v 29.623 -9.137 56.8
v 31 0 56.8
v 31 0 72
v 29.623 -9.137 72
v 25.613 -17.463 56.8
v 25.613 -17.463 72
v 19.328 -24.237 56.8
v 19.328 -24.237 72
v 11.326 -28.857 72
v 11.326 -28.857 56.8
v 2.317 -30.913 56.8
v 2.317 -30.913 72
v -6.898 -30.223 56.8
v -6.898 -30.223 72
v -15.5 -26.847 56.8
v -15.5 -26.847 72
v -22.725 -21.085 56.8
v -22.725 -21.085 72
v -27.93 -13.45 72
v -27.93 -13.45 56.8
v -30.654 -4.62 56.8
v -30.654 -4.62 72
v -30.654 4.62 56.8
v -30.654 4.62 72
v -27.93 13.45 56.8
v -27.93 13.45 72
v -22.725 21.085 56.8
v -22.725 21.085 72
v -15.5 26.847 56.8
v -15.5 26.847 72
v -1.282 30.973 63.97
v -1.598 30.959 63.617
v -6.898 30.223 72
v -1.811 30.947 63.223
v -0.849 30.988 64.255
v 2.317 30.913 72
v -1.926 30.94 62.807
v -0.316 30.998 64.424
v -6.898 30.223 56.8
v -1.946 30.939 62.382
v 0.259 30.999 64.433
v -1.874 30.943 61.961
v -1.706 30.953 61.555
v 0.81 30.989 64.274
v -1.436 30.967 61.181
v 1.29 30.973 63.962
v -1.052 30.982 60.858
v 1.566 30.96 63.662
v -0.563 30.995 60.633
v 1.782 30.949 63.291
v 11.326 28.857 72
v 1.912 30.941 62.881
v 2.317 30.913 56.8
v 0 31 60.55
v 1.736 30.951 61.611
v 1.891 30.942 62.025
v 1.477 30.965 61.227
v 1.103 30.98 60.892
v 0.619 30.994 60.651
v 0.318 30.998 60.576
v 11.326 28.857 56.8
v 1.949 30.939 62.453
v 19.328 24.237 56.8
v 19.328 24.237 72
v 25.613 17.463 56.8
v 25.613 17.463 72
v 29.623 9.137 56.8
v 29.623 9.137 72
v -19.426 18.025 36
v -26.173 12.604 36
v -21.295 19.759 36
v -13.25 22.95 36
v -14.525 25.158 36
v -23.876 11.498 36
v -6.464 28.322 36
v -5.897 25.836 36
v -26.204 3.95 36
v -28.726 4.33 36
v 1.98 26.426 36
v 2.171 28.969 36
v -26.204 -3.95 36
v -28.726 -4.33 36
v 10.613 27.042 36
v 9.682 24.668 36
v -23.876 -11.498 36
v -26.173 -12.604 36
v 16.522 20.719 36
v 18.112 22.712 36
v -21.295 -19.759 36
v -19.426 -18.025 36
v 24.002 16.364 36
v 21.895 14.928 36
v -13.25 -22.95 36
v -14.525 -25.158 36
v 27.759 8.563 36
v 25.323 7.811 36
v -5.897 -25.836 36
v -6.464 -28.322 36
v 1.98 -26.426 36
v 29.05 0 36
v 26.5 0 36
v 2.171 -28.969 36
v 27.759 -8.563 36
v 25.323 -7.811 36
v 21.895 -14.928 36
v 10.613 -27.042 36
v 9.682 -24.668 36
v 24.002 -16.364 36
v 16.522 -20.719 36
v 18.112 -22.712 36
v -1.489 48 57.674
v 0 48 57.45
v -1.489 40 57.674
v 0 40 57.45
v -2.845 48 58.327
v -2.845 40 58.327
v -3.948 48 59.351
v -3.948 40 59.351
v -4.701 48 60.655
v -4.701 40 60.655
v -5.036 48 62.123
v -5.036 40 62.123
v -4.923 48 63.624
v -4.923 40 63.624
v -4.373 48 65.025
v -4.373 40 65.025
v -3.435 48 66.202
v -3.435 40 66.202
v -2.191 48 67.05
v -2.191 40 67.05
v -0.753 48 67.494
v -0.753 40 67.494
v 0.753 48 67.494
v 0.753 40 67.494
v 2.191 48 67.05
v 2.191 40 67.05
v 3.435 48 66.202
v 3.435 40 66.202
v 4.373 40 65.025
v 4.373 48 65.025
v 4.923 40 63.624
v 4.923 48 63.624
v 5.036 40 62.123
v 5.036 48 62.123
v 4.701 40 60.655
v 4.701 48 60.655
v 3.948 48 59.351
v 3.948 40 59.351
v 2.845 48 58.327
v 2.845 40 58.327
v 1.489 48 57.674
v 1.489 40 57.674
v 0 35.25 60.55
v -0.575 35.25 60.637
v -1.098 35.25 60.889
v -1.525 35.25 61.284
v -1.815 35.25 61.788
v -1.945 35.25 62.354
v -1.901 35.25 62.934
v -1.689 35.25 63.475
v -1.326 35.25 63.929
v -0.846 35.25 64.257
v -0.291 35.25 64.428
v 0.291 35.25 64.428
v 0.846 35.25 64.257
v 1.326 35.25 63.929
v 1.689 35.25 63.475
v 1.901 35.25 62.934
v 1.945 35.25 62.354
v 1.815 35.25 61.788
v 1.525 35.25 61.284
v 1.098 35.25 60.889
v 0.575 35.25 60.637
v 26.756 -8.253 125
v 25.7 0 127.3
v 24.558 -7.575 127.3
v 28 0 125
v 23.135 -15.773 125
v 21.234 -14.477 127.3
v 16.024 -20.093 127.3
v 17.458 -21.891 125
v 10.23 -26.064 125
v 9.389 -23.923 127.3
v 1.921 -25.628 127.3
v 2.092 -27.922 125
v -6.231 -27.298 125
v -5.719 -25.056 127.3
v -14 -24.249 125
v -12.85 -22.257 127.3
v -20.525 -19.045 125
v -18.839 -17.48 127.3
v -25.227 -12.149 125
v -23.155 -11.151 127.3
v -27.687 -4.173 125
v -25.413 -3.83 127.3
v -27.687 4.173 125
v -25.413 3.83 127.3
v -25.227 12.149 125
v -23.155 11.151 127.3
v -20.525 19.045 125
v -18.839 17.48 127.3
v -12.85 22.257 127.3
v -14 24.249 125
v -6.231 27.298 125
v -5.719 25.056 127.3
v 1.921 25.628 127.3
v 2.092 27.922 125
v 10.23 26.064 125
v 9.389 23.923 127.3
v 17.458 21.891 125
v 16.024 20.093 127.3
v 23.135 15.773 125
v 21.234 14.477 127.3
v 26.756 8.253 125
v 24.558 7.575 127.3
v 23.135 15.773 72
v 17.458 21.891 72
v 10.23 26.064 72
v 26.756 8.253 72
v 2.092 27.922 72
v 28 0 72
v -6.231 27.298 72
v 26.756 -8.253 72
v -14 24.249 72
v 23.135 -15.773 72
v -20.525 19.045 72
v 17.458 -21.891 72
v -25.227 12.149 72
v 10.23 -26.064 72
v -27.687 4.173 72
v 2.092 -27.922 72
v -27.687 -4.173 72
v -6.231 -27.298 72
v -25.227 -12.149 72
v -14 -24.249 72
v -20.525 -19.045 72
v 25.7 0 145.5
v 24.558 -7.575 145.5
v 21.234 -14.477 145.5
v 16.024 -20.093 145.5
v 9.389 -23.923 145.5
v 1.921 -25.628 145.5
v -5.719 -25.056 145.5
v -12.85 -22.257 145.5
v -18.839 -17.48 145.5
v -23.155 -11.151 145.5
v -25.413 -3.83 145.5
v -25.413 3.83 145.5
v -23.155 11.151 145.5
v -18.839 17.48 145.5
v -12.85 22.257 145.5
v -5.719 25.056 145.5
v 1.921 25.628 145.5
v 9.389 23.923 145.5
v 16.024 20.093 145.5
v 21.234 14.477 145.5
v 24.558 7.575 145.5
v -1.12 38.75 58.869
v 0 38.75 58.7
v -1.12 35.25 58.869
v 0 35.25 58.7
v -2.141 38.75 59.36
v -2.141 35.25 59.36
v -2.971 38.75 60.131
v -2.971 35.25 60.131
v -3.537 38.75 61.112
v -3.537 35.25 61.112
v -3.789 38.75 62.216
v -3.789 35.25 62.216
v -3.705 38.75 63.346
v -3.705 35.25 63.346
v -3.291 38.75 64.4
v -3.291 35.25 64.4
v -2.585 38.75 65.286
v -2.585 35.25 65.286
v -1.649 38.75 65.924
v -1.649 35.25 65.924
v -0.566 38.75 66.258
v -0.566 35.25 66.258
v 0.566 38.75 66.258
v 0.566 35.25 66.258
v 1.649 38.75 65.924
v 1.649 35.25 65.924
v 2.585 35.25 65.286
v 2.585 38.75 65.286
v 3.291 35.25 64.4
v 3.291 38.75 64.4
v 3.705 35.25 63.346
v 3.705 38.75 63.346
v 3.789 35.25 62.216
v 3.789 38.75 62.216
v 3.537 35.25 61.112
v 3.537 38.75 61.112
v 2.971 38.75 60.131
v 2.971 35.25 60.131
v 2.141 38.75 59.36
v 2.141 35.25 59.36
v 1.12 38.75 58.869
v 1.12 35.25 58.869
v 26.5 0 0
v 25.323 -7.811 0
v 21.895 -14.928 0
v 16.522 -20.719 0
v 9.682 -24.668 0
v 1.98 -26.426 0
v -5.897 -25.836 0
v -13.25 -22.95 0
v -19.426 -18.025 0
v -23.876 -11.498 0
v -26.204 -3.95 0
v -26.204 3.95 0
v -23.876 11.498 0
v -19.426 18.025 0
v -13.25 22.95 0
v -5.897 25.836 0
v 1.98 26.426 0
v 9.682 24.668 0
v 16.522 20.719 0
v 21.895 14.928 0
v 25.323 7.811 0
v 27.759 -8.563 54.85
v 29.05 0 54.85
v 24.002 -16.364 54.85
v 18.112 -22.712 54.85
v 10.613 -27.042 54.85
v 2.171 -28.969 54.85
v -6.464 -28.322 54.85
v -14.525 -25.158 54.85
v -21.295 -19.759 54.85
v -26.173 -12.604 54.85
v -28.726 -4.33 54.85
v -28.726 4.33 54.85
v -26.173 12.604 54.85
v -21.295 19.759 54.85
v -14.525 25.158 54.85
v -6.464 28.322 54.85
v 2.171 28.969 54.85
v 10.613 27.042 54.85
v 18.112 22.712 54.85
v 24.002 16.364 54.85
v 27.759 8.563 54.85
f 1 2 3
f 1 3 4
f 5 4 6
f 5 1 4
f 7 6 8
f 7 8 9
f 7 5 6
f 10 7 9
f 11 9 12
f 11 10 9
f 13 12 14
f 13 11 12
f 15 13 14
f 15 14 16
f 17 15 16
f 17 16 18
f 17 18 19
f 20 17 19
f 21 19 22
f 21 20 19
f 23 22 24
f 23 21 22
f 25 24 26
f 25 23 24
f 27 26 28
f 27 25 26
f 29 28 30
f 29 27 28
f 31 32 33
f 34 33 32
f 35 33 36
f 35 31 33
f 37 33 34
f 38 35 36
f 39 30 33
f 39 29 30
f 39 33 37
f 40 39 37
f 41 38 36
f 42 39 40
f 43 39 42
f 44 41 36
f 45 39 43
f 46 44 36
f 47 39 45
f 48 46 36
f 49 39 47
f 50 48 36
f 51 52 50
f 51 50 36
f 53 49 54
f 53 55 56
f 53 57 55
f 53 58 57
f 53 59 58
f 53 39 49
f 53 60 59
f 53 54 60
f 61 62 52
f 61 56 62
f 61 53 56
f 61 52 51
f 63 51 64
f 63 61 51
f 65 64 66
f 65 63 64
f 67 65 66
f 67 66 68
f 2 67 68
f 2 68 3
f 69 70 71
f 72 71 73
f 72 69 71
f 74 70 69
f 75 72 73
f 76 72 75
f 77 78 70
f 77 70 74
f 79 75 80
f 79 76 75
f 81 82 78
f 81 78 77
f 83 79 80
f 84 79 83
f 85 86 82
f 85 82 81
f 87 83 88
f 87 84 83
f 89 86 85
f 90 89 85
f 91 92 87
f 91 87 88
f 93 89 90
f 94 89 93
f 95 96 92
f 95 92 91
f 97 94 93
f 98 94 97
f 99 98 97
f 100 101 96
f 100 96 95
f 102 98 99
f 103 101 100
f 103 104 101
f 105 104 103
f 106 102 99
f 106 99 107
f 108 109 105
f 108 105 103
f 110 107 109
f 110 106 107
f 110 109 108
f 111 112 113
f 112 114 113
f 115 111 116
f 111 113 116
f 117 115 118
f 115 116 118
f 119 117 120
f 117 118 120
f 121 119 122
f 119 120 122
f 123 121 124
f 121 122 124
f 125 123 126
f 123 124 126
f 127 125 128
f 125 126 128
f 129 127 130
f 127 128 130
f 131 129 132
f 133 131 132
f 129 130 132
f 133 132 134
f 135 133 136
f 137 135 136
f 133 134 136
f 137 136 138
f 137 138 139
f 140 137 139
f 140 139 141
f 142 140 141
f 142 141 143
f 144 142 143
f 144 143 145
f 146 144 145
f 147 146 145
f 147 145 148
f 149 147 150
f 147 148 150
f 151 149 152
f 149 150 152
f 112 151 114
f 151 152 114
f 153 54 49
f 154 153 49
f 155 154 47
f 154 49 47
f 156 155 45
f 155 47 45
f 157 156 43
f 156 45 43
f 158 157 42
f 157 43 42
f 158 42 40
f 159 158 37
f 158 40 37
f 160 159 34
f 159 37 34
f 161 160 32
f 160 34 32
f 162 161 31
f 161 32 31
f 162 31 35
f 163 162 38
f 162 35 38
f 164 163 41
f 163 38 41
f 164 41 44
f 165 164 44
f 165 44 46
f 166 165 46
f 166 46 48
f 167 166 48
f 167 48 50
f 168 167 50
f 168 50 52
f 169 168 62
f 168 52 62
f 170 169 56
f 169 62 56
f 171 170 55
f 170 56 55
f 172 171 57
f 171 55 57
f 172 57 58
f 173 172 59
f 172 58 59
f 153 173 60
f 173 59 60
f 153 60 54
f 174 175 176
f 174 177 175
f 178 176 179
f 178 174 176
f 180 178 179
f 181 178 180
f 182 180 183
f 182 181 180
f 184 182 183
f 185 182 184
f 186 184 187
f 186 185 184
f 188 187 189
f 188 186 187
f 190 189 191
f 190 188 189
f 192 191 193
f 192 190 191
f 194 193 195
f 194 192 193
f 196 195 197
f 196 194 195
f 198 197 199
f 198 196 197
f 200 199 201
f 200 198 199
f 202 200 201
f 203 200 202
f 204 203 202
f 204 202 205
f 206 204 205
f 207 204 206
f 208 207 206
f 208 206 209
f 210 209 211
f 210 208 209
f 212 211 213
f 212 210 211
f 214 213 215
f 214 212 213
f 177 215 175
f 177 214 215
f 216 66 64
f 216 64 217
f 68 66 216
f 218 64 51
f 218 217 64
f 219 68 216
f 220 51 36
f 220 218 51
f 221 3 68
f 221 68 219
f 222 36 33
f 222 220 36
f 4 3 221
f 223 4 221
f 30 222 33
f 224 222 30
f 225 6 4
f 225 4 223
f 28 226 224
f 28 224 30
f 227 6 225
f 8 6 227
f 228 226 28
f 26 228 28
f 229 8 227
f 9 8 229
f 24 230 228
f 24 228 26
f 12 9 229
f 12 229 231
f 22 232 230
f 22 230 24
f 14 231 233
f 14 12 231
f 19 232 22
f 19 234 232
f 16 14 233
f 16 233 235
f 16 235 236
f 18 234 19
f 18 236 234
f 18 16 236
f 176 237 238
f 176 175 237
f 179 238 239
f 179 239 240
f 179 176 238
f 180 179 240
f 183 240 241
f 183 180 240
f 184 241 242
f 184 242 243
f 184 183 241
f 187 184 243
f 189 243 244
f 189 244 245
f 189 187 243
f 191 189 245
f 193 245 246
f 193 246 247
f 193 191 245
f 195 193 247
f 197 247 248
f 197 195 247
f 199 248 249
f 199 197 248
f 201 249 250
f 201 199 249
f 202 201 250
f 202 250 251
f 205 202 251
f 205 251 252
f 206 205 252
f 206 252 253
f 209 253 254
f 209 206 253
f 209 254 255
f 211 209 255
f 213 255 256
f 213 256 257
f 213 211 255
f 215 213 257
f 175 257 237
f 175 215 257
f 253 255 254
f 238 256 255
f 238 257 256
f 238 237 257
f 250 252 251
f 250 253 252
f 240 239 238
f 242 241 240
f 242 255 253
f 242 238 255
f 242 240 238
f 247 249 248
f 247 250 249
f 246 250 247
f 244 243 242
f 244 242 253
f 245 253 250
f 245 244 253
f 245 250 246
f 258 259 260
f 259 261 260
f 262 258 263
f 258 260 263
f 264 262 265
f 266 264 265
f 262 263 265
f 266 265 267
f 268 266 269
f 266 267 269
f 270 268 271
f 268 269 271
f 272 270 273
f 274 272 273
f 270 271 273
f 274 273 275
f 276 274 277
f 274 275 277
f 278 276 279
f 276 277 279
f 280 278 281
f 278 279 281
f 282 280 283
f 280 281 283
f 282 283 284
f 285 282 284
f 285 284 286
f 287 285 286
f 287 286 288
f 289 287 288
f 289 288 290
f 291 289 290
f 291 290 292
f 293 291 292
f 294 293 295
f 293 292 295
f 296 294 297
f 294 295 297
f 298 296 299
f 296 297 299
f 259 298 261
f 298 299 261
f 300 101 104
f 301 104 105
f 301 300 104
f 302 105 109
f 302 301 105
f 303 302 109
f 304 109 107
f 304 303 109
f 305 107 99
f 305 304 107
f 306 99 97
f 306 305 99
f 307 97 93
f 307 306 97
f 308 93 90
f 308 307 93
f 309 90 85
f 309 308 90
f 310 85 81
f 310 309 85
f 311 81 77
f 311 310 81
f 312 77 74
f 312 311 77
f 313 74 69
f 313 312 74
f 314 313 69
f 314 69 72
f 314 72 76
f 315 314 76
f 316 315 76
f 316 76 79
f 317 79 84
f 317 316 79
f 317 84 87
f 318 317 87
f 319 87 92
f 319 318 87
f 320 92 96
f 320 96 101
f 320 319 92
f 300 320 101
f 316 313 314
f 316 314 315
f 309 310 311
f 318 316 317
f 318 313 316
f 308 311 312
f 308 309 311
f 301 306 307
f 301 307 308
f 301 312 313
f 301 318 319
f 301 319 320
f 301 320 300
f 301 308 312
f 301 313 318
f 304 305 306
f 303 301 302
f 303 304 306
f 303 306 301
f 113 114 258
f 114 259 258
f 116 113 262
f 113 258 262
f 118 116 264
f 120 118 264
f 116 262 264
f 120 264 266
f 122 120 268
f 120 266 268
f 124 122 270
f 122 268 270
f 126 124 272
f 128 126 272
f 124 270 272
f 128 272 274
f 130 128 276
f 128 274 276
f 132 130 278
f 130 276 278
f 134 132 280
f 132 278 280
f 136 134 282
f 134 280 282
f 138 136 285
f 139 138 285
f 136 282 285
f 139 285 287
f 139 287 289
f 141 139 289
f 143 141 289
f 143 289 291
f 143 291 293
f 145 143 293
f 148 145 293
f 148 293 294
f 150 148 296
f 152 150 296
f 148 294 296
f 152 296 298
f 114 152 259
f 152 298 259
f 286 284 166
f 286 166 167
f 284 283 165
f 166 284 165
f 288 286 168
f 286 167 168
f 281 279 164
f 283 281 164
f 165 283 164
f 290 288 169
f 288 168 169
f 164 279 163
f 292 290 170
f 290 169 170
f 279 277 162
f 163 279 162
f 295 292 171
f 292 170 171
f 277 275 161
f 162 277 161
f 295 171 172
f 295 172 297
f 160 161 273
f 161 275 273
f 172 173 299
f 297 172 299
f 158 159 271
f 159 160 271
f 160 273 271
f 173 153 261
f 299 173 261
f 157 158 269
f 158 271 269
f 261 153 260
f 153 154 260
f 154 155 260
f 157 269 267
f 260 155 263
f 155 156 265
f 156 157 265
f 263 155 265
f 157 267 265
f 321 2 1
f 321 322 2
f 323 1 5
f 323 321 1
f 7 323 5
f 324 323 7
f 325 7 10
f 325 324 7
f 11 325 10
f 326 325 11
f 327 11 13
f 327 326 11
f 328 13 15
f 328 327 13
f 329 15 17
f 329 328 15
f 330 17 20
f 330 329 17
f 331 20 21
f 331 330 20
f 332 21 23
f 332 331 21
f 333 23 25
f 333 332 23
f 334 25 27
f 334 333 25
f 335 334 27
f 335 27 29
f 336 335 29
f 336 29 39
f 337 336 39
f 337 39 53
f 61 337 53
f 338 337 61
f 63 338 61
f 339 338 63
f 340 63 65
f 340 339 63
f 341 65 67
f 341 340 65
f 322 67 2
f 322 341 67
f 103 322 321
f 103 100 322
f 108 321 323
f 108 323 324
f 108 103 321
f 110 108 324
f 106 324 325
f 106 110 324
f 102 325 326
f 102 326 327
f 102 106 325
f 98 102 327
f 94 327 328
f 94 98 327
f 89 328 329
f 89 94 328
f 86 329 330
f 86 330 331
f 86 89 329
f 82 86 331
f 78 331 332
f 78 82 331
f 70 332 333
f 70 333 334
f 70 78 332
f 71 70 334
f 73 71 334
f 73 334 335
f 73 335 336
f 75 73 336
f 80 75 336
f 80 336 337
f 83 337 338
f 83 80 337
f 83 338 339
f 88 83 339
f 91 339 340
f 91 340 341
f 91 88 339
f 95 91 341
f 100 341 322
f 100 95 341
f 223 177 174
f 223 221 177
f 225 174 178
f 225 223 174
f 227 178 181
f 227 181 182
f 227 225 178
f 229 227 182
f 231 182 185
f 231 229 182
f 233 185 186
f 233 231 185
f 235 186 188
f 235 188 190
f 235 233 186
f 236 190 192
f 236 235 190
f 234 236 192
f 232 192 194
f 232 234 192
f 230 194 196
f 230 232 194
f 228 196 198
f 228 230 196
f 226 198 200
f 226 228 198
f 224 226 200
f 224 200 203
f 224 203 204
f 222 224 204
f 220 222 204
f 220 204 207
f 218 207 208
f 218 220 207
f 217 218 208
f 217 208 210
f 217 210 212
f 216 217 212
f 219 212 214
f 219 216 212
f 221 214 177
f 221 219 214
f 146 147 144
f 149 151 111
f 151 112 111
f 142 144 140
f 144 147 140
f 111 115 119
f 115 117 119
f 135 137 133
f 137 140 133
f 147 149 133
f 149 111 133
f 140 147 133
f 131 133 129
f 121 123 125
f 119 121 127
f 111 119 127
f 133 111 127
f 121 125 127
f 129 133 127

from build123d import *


with BuildPart() as part:
    # Sketch1 → Revolve1 (revolve)
    with BuildSketch(Plane(origin=(0, 0, 0), x_dir=(0, 0, -1), z_dir=(1, 0, 0)), mode=Mode.PRIVATE) as revolve1_sk:
        Polygon((0, 0), (-145.5, 0), (-145.5, 25.7), (-127.3, 25.7), (-125, 28), (-72, 28), (-72, 31), (-56.8, 31), (-54.85, 29.05), (-36, 29.05), (-36, 26.5), (0, 26.5), align=None)
    revolve(revolve1_sk.sketch.rotate(Axis((0, 0, 0), (0, 0, -1)), 90), axis=Axis((0, 0, 0), (0, 0, -1)))

    # Sketch2 → Revolve2 (revolve)
    with BuildSketch(Plane(origin=(0, 0, 0), x_dir=(0, 0, -1), z_dir=(1, 0, 0))):
        Polygon((-62.5, 31), (-62.5, 48), (-57.45, 48), (-57.45, 40), (-58.7, 38.75), (-58.7, 35.25), (-60.55, 35.25), (-60.55, 29), (-62.5, 29), align=None)
    revolve(axis=Axis((0, 48, 62.5), (0, 1, 0)))


solid = part.part
